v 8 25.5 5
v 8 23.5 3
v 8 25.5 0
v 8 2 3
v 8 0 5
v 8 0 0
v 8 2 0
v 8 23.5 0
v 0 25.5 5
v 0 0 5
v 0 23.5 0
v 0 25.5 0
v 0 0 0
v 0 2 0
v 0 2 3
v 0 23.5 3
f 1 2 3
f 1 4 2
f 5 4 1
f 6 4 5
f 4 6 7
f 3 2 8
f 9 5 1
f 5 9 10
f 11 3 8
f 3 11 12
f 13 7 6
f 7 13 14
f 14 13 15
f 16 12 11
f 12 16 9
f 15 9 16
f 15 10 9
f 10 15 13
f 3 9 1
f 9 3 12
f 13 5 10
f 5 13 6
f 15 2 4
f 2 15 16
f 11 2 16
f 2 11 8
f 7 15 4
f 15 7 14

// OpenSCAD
wall = 2;

length = 21.5;
height = 3;
width  = 8;


difference(){
    cube([width, length+wall+wall, height+wall]);
    translate([0,wall,0]){
        cube([width, length, height]);
    }
}
